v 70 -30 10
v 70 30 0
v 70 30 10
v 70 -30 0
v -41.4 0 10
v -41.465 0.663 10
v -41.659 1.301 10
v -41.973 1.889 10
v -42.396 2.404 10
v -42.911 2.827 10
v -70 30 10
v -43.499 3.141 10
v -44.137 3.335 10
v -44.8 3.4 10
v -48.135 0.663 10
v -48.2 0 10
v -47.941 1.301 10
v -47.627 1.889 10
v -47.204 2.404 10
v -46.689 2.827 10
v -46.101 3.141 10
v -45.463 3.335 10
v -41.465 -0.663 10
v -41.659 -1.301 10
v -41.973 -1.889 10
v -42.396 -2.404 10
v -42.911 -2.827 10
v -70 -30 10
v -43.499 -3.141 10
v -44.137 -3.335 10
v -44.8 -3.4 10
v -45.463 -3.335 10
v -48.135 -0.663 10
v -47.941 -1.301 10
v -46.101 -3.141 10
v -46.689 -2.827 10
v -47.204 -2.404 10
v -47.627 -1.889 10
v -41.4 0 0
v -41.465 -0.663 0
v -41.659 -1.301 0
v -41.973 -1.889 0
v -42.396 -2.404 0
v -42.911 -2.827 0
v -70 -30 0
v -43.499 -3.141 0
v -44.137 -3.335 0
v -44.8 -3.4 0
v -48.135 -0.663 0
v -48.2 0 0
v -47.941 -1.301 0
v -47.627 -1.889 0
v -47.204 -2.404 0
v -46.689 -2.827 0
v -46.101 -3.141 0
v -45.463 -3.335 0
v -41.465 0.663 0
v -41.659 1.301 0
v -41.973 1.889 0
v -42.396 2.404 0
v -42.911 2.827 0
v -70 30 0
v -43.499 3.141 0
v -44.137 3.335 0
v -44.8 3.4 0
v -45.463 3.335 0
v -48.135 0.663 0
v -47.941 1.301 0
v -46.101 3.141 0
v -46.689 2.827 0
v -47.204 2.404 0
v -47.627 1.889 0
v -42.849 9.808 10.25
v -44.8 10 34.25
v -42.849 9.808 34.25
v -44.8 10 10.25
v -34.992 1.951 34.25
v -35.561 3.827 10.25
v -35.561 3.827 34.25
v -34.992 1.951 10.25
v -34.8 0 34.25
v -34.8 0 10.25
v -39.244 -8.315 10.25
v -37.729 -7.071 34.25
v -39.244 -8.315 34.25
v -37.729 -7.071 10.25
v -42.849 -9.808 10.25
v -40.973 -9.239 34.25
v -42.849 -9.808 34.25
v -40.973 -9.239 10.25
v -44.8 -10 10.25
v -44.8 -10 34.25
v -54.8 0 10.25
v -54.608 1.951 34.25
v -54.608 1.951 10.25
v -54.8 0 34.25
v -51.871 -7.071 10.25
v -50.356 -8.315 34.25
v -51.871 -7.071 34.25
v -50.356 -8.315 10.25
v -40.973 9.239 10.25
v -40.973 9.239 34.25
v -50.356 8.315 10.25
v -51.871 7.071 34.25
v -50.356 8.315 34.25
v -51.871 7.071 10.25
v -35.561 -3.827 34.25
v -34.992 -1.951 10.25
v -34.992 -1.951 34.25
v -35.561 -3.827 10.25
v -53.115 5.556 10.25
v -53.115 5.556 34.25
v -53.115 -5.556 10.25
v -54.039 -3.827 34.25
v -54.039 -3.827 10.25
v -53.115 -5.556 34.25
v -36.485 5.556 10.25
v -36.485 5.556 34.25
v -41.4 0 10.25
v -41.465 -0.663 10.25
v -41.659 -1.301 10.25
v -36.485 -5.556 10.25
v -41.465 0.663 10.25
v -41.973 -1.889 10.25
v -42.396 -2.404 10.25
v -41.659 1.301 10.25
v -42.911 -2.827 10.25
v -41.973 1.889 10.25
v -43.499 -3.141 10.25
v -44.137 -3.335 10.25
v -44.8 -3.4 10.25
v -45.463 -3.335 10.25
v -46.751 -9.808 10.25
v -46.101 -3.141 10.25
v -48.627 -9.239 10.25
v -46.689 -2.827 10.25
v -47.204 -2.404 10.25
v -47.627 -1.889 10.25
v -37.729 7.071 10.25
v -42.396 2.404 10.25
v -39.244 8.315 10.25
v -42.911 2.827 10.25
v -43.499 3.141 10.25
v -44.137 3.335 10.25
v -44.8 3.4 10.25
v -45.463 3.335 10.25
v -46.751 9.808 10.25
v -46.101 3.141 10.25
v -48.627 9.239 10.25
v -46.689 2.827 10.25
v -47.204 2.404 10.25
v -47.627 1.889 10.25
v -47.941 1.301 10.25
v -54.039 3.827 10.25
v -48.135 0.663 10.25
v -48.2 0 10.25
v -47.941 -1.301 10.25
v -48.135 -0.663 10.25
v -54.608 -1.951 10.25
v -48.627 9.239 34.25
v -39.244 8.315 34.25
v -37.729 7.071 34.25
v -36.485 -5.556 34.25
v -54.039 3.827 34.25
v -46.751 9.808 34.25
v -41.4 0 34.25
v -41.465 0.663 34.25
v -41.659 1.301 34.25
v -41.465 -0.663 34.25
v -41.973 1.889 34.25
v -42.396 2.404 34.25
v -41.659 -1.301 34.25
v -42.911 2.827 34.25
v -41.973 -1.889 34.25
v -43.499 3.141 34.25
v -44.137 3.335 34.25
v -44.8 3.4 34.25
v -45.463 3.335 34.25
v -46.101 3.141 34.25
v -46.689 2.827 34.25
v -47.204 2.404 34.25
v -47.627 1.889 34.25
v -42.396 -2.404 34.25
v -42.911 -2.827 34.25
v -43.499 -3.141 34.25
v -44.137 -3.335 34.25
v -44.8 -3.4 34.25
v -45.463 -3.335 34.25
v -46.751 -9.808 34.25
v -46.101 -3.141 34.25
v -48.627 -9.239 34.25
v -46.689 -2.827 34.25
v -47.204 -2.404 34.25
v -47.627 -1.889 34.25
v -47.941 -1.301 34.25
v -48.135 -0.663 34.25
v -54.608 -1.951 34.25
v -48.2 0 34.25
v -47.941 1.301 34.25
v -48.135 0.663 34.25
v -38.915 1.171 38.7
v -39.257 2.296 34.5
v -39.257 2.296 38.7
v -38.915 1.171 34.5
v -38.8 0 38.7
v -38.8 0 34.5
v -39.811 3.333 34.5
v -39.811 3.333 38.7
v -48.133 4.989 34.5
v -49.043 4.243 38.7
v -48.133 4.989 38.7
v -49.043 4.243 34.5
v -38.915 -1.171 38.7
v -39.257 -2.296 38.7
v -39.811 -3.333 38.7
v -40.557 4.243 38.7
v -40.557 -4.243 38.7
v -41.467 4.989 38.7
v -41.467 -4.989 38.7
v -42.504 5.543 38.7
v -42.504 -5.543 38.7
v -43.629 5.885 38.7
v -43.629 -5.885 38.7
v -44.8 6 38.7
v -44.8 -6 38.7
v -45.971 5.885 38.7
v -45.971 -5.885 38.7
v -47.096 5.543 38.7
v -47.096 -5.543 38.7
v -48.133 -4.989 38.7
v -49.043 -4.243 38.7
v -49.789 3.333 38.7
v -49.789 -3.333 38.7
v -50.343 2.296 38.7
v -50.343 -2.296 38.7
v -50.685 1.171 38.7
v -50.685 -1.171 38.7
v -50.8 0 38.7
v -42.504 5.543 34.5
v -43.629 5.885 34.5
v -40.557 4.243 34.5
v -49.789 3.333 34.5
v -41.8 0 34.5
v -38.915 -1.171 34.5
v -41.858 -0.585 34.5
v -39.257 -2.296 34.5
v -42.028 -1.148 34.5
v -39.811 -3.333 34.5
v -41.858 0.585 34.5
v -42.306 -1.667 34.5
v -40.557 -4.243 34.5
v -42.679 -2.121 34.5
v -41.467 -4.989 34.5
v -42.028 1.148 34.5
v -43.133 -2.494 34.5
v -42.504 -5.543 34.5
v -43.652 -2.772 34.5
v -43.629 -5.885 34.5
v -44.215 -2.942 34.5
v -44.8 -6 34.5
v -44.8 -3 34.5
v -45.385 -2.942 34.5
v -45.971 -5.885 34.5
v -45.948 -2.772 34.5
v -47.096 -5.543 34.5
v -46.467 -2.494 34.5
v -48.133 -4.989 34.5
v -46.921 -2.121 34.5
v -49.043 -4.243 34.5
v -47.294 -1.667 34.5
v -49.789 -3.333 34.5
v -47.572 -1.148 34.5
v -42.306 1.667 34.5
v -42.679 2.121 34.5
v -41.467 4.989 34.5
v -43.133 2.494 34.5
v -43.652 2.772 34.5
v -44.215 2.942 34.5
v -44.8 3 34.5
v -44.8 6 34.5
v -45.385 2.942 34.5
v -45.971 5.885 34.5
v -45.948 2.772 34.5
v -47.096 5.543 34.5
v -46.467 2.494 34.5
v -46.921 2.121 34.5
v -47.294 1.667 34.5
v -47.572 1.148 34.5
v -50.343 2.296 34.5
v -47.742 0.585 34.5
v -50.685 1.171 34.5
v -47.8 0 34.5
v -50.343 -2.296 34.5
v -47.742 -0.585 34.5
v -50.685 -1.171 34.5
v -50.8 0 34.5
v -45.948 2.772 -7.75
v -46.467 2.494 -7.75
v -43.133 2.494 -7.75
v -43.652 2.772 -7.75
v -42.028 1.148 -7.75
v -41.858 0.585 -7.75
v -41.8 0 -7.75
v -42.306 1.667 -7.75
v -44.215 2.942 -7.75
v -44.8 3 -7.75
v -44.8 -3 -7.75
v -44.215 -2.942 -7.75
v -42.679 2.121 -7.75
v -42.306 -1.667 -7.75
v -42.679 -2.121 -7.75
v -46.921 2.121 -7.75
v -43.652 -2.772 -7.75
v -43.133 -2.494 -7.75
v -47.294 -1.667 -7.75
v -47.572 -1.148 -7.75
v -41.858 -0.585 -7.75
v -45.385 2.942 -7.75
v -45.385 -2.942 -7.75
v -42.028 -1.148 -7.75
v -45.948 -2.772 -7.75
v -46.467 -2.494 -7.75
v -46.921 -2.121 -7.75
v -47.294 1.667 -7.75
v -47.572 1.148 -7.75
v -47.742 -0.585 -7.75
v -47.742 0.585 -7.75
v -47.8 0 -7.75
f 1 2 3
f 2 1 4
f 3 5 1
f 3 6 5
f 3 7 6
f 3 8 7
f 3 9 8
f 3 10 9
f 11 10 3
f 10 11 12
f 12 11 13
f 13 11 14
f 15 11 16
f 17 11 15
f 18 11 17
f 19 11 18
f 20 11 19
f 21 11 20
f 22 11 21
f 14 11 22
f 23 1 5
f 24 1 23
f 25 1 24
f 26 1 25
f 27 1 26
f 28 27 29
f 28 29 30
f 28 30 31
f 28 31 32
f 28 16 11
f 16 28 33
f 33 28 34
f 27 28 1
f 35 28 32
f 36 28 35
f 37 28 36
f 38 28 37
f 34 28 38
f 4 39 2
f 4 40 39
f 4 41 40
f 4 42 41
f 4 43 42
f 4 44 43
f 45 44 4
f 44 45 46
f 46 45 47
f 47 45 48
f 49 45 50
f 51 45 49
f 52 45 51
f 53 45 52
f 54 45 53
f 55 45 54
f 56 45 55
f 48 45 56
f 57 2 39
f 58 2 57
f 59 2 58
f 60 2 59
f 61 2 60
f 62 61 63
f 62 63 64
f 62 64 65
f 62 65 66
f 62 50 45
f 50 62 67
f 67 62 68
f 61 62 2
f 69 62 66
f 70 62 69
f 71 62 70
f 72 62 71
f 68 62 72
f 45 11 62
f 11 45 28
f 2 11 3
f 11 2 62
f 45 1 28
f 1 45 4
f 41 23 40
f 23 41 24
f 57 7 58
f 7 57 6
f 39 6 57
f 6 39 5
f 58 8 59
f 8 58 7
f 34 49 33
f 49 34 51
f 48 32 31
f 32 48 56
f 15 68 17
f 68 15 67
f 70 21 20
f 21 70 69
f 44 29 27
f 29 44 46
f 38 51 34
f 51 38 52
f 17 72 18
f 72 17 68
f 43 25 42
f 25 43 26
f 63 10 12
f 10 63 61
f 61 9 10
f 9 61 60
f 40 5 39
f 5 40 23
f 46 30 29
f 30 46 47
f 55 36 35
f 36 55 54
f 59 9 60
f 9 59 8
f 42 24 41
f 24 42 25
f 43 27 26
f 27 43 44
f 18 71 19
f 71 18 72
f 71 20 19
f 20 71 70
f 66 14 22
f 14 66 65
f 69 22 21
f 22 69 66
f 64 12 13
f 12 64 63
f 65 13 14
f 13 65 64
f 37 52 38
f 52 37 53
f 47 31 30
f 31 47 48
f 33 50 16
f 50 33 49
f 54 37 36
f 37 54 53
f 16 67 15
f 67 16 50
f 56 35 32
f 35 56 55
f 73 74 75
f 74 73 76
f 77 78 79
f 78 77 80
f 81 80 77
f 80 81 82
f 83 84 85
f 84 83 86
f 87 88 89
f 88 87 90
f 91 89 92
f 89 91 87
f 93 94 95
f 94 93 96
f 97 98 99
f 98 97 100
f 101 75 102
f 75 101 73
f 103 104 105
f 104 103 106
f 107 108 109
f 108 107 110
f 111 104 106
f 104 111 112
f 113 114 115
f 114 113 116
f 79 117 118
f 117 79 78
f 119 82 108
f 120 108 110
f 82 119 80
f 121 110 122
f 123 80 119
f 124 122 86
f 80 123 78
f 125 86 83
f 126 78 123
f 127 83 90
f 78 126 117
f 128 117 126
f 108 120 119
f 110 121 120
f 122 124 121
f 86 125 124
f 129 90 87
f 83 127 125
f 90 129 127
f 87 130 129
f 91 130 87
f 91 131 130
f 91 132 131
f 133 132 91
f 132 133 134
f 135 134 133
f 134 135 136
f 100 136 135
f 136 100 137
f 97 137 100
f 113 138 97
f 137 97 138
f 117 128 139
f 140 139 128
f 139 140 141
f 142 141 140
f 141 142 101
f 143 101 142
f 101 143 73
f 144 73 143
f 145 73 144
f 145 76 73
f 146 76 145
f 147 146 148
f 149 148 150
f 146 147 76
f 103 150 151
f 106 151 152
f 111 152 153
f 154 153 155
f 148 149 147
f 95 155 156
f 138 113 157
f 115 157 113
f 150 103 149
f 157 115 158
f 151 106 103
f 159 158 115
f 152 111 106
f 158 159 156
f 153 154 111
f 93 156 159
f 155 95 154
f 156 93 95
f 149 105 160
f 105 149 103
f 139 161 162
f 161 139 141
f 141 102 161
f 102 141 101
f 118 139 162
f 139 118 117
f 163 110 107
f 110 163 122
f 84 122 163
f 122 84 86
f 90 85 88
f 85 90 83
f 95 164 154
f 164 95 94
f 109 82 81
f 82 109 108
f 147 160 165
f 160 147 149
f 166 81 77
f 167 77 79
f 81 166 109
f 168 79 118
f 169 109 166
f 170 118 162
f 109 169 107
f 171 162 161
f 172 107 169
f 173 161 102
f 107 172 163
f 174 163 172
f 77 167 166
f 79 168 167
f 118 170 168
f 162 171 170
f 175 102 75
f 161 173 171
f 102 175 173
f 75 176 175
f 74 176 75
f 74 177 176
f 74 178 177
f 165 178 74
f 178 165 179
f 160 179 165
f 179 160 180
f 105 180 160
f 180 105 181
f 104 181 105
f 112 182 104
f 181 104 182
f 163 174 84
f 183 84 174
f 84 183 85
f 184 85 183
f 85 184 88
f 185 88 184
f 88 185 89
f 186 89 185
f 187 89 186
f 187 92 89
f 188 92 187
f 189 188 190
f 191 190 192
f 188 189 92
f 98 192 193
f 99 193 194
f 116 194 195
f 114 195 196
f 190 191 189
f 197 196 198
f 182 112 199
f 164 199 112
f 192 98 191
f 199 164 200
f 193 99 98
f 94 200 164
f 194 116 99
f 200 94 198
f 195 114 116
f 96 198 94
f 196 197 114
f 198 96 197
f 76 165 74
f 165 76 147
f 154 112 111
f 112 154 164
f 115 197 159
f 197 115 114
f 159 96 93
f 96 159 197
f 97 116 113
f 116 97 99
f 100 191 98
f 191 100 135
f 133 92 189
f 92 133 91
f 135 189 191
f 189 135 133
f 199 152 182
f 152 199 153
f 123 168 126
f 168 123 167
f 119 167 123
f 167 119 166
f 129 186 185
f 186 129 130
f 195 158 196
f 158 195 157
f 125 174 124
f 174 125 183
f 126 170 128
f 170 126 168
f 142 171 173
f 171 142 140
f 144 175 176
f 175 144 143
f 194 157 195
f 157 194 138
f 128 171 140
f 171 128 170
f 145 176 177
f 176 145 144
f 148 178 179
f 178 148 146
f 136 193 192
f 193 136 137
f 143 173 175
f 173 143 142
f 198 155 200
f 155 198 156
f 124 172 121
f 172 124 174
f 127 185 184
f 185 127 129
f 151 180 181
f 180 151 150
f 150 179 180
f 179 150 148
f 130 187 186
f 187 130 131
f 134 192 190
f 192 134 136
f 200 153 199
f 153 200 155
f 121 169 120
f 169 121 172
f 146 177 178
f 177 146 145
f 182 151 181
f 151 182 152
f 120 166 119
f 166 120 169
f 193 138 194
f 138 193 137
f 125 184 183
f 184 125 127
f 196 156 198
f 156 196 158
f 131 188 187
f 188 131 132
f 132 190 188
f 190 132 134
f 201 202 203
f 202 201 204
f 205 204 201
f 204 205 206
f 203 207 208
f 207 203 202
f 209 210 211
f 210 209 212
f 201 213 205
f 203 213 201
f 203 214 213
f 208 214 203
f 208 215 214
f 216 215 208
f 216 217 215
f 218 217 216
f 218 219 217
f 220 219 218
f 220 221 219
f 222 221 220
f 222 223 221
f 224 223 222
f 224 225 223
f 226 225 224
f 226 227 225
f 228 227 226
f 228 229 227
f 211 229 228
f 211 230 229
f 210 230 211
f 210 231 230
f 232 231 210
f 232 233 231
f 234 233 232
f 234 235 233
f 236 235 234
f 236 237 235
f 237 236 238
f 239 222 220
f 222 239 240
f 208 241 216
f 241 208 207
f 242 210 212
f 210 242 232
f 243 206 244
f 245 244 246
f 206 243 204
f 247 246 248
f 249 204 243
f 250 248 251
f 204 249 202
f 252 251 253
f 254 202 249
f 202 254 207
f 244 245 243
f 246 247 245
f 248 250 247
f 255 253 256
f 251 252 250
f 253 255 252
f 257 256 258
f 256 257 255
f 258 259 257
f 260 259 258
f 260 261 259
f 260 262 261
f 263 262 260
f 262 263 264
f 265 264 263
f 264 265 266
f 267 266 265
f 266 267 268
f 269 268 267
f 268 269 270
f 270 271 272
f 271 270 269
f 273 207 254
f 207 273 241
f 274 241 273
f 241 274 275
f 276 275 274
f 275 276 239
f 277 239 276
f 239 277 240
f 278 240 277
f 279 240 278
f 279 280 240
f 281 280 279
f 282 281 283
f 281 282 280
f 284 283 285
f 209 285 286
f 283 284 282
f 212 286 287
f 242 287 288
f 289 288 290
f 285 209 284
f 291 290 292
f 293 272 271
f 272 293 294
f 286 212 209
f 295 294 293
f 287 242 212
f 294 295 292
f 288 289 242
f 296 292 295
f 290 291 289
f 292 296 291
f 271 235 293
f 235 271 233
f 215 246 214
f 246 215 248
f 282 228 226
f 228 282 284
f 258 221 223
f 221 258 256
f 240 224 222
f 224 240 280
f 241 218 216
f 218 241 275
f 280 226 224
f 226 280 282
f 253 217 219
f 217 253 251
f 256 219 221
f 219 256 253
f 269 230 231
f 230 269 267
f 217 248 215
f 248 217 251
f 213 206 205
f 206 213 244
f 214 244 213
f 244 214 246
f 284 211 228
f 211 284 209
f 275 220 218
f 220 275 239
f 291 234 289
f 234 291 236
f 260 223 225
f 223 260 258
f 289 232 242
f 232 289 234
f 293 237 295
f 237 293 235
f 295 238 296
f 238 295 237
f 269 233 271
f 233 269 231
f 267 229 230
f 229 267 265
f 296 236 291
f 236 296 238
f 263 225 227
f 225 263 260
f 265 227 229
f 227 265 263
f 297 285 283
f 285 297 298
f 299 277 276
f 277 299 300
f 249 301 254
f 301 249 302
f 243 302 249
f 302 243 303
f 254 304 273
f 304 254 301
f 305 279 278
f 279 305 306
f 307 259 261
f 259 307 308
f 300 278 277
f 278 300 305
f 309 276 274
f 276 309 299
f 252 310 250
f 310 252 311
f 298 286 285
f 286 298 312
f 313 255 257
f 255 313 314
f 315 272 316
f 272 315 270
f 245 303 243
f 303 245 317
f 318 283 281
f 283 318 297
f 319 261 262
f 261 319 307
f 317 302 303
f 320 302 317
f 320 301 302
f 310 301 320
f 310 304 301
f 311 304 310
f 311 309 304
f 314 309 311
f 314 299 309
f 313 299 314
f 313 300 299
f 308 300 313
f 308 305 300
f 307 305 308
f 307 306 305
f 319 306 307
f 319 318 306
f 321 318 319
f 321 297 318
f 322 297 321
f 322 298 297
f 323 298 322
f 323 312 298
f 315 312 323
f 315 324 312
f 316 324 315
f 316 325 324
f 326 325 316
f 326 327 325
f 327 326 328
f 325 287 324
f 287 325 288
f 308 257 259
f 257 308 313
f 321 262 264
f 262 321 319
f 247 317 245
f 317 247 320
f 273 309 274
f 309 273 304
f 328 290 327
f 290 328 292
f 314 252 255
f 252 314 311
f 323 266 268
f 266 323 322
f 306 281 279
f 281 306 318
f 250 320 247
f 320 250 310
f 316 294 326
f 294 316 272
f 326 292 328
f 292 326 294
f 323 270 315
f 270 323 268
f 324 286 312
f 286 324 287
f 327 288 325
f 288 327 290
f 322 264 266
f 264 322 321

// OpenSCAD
$fn = 32;

// ------------------------------------------------------------------------
// Standoff columns: 1 d20 standoffs, bolts d6
// Every part is its own module, assembly() places them once.
// ------------------------------------------------------------------------

// --- part 1 ---
module base_plate() {
  difference() {
    translate([-70, -30, 0]) cube([140, 60, 10]);
    translate([-44.8, 0, -1]) cylinder(h = 12, d = 6.8);
  }
}

// --- part 2 ---
module spacer() {
  difference() {
      translate([0, 0, 0]) cylinder(h = 24, d = 20);
      translate([0, 0, -1]) cylinder(h = 26, d = 6.8);
    }
}

// --- part 3 ---
module bolt() {
  cylinder(h = 4.2, d = 12);
  translate([0, 0, -42.25]) cylinder(h = 42.25, d = 6);
}

// --- assembly ---
module assembly() {
  translate([0, 0, 0]) rotate([0, 0, 0]) base_plate();
  translate([-44.8, 0, 10.25]) rotate([0, 0, 0]) spacer();
  translate([-44.8, 0, 34.5]) rotate([0, 0, 0]) bolt();
}

assembly();
